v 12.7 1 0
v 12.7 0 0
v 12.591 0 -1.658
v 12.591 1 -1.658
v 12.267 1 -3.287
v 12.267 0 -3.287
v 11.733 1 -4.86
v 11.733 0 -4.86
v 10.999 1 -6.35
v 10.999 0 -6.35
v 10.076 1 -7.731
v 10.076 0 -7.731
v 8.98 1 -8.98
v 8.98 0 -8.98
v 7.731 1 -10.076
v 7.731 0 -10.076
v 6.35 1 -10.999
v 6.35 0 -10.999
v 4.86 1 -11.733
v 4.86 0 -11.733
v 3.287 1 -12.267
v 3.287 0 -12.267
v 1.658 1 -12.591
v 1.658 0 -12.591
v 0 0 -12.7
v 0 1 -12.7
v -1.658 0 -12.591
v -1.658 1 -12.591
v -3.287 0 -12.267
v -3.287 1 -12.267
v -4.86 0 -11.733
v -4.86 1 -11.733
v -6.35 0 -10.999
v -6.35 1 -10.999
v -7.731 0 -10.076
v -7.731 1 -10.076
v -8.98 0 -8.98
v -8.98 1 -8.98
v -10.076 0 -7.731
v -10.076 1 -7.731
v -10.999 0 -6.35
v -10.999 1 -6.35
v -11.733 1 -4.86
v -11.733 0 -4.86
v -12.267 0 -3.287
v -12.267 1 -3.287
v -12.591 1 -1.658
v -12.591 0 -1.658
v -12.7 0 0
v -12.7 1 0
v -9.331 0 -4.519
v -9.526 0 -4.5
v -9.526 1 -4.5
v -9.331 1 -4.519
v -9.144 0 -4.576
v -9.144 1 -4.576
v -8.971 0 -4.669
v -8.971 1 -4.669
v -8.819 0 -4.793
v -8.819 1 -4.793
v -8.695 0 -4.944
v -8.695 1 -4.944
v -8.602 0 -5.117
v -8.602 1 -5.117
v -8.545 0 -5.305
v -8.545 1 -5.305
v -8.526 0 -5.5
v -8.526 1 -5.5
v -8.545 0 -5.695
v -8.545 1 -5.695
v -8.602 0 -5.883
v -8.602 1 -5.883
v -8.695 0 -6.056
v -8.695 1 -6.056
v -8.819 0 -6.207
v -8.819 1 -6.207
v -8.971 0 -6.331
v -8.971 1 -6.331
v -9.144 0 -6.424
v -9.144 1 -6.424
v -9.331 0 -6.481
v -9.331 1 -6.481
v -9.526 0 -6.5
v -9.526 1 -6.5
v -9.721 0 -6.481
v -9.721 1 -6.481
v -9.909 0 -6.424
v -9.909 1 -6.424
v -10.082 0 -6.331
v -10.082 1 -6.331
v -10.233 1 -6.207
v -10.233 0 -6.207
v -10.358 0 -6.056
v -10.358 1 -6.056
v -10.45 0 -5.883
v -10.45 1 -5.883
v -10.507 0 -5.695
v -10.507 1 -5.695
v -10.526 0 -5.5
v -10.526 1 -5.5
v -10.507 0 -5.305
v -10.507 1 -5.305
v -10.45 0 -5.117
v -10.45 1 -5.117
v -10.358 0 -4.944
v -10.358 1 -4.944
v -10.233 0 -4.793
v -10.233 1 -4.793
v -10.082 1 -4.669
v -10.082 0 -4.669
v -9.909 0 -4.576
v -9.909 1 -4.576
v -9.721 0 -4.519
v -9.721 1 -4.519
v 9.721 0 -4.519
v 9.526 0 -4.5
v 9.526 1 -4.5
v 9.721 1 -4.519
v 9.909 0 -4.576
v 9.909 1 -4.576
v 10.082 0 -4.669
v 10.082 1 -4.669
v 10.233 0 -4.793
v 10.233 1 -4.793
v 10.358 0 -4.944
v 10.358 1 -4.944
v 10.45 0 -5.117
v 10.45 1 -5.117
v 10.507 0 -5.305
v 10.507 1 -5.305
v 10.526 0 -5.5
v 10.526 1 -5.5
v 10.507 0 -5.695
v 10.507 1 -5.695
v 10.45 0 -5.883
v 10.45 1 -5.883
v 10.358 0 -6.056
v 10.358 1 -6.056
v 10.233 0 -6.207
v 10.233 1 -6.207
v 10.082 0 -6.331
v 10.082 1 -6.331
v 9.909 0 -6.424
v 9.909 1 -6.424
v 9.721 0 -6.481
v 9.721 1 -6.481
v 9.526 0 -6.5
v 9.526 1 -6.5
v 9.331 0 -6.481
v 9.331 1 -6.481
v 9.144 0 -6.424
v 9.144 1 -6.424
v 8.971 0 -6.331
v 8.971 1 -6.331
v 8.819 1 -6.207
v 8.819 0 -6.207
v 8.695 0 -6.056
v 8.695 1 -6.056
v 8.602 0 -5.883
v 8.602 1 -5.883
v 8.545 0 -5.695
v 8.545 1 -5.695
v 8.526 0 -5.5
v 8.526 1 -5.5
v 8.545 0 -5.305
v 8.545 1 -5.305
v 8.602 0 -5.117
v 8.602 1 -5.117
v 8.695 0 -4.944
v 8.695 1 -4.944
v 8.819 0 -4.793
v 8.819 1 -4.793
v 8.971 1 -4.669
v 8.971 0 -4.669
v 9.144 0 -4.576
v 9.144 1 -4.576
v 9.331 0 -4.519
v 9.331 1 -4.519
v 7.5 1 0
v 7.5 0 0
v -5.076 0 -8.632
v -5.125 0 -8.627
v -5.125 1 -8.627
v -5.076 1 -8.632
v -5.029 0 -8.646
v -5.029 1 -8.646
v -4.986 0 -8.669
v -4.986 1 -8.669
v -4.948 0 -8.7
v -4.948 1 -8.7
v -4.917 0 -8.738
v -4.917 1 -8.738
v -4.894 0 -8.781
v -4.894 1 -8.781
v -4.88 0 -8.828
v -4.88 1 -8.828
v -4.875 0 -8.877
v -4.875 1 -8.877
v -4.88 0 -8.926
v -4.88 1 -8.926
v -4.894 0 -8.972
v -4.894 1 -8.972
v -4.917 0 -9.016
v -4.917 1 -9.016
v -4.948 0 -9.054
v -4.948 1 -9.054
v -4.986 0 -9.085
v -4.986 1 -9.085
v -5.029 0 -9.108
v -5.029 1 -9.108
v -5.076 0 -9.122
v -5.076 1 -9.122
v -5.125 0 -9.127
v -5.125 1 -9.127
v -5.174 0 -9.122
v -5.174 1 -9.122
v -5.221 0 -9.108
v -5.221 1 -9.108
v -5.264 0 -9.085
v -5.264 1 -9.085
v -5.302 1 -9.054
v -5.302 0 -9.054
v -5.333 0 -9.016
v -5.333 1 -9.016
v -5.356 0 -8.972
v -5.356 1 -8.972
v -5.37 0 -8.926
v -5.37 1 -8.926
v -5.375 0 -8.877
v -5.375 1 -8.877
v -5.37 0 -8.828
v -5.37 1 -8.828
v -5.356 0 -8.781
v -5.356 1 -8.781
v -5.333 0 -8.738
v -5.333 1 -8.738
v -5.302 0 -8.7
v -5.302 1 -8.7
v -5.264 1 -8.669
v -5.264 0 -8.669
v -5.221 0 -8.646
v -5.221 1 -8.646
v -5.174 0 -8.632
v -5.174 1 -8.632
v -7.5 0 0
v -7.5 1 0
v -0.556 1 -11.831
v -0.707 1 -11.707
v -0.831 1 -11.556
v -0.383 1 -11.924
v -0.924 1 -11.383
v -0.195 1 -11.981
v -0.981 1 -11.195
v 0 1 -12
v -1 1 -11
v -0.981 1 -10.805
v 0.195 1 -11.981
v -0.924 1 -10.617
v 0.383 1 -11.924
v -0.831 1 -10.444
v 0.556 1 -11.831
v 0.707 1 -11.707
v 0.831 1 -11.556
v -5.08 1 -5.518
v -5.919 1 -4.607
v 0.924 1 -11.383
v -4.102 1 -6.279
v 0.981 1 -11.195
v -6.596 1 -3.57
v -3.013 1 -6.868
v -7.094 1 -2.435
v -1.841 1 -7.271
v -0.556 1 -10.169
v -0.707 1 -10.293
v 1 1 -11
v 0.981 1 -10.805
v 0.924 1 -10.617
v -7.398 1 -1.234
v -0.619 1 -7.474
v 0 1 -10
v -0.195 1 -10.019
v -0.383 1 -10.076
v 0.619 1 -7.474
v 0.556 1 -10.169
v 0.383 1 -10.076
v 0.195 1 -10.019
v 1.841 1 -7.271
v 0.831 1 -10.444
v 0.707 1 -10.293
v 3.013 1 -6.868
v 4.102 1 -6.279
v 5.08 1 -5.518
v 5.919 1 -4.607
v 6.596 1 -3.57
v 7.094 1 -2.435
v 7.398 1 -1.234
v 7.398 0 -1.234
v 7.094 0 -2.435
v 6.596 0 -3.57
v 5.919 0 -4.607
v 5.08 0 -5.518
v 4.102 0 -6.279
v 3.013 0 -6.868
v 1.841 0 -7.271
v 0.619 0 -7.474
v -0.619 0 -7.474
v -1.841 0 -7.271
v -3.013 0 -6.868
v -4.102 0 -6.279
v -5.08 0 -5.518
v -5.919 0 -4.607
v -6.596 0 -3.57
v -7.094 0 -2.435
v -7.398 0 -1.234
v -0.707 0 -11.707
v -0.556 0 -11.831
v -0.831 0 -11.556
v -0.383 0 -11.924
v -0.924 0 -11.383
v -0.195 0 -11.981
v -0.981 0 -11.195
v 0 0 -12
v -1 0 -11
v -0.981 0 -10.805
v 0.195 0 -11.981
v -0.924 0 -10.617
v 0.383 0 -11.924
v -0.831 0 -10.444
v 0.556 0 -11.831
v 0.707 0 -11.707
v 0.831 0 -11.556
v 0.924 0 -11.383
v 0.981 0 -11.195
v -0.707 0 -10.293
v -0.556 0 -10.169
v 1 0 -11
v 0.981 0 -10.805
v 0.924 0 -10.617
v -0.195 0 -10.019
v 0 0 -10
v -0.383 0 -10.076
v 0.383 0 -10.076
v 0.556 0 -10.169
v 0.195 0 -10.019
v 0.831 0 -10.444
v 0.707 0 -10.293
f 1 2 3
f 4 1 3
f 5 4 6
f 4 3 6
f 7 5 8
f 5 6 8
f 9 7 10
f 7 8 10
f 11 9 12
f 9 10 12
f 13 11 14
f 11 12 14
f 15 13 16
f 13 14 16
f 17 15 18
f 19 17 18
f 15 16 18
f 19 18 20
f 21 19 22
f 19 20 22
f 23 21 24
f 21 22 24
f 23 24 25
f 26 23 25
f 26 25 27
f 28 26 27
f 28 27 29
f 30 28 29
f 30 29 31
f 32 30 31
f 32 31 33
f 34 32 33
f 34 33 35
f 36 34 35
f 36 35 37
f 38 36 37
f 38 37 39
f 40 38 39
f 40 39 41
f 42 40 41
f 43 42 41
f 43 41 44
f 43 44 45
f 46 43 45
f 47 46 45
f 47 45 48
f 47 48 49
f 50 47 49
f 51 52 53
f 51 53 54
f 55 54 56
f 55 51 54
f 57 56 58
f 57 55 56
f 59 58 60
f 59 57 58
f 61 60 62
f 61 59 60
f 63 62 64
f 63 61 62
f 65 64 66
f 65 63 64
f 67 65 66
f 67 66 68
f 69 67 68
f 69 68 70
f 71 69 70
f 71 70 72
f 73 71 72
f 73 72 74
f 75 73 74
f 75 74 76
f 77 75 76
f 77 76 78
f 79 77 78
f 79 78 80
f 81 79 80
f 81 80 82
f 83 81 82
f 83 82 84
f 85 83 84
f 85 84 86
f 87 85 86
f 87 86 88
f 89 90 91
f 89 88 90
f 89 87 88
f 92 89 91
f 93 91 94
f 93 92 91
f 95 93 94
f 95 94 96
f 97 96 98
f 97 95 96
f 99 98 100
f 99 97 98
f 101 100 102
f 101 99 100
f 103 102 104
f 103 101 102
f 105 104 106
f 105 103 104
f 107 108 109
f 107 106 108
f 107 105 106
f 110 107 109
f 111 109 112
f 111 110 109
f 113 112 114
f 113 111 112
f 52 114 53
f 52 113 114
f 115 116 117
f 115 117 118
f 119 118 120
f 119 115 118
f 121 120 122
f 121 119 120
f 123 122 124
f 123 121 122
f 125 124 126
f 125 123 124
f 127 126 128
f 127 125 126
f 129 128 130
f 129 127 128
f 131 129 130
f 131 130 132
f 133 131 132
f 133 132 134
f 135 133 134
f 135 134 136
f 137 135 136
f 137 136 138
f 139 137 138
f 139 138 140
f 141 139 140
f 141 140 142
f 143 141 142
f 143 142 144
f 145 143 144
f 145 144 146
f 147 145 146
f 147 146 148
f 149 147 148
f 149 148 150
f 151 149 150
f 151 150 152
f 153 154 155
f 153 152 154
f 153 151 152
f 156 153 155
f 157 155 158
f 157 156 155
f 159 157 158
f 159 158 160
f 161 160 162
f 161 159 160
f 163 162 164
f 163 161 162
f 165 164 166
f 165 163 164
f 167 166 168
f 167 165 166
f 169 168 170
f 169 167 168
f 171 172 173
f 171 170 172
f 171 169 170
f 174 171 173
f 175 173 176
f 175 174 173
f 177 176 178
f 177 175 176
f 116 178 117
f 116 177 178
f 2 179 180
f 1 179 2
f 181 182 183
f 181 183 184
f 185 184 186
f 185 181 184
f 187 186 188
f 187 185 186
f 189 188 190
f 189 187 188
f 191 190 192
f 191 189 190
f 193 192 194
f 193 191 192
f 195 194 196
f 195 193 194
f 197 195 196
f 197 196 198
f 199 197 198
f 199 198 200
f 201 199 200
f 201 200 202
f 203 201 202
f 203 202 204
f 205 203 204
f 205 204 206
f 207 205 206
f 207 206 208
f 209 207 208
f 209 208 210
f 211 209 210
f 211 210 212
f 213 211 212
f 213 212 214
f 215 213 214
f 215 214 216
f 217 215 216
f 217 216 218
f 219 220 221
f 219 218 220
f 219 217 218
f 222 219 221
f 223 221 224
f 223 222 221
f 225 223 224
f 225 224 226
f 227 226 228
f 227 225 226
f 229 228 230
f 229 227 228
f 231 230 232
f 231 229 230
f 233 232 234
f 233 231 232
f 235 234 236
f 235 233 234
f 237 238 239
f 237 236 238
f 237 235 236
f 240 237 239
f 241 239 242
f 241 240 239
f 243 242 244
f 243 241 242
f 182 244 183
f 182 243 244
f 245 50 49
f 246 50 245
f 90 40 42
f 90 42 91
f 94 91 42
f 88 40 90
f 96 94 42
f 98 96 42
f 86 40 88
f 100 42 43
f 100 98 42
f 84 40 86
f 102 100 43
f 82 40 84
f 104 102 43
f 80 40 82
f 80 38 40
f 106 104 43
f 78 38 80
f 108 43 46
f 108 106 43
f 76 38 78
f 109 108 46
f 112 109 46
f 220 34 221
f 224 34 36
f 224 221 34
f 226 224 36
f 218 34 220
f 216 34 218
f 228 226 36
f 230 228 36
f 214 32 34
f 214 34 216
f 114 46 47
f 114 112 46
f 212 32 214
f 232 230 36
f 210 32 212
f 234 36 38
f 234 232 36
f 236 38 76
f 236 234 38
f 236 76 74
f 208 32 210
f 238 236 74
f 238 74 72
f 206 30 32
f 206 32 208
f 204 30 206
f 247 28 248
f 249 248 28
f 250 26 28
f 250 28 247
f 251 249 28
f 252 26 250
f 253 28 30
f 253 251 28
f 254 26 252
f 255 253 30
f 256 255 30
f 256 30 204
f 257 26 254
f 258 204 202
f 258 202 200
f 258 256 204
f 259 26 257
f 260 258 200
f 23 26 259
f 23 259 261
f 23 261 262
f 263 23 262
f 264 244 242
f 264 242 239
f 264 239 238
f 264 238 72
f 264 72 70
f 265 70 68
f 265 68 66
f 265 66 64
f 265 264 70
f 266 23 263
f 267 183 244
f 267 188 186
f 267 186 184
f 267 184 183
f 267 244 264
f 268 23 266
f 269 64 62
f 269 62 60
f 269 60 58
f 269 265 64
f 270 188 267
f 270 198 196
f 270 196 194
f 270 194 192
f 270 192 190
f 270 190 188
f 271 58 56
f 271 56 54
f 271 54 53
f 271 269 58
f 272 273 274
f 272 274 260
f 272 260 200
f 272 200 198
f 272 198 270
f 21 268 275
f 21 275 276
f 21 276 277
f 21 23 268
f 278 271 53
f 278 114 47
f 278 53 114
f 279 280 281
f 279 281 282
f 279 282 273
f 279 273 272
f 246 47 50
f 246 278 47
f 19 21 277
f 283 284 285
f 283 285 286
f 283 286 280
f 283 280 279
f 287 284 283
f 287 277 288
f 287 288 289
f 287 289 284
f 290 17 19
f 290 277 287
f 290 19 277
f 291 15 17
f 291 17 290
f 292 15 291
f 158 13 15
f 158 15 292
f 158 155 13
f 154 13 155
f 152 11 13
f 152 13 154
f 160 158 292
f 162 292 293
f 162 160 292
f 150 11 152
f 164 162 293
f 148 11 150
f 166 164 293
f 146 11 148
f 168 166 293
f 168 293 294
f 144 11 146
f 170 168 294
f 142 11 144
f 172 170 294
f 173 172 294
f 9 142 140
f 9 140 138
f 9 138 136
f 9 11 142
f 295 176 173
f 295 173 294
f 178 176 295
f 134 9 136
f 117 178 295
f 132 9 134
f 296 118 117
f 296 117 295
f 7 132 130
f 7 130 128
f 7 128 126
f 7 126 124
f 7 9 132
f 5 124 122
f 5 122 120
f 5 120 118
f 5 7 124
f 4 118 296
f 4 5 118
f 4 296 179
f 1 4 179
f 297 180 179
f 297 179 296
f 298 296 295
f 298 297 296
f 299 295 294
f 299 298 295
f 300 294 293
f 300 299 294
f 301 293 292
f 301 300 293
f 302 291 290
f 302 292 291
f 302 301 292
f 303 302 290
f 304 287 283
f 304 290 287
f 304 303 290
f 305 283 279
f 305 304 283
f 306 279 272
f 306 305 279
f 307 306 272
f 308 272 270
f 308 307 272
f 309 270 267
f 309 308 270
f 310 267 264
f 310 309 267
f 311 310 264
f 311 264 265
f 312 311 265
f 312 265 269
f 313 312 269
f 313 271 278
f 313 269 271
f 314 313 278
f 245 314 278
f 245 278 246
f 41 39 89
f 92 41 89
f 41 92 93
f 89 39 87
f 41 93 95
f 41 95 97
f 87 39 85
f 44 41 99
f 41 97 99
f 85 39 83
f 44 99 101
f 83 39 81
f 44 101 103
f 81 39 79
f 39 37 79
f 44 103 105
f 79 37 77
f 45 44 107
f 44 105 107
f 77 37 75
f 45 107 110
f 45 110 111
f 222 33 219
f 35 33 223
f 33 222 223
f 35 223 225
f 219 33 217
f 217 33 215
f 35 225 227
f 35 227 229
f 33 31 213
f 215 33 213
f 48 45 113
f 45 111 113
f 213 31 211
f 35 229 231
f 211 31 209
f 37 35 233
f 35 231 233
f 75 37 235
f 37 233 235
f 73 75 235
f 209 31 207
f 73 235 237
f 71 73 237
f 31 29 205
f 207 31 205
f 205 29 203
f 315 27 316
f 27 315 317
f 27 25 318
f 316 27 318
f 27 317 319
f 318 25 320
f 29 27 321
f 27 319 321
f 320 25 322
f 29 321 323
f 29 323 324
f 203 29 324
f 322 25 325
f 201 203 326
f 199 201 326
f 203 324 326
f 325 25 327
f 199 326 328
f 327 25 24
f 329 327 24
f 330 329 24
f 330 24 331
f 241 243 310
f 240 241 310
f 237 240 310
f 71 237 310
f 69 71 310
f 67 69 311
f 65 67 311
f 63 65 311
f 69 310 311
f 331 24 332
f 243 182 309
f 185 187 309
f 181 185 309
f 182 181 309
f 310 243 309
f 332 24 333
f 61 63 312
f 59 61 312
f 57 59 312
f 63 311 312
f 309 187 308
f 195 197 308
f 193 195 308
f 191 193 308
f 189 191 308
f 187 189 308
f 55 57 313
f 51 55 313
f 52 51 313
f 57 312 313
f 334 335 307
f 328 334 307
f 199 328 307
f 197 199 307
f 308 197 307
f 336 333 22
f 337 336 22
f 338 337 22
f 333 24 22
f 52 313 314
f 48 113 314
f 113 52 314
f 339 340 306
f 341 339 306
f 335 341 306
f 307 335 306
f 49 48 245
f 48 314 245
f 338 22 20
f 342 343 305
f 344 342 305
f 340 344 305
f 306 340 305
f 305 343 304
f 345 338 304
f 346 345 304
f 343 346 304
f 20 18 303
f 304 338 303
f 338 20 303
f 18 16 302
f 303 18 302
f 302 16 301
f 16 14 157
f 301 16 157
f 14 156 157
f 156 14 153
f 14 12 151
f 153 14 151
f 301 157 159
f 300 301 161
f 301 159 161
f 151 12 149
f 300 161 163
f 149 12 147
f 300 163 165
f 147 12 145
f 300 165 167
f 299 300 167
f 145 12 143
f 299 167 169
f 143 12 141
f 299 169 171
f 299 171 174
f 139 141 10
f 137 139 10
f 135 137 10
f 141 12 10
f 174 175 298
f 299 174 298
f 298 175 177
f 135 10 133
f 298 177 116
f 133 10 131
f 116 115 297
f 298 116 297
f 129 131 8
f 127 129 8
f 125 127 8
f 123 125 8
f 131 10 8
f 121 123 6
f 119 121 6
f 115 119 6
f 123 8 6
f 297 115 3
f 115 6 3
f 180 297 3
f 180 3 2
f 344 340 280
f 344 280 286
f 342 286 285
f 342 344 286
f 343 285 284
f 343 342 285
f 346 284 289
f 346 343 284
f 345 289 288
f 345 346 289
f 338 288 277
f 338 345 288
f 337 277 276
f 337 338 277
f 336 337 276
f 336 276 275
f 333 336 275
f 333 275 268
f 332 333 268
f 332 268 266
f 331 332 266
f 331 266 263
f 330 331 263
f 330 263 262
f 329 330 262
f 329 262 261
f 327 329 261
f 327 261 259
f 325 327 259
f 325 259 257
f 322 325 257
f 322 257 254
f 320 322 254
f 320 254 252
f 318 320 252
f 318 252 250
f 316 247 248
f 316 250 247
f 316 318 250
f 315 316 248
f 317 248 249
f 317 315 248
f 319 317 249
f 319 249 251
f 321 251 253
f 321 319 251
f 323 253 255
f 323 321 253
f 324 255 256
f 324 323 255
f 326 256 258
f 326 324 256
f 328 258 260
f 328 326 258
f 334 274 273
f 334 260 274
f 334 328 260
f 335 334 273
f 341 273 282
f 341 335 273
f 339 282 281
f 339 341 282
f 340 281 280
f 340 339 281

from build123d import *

# Parameters (mm, degrees)
SKETCH1_R               = 12.7
BOSS_EXTRUDE1_DEPTH     = 1
CUT_EXTRUDE1_DEPTH      = 18.98832955
CUT_EXTRUDE1_DEPTH_BACK = 18.98832955
SKETCH19_R              = 1
CUT_EXTRUDE2_DEPTH      = 18.98832955
CUT_EXTRUDE2_DEPTH_BACK = 18.98832955
SKETCH20_R              = 7.5
SKETCH21_W              = 65.874202484
SKETCH21_H              = 51.979273979
CUT_EXTRUDE3_DEPTH      = 18.98832955
CUT_EXTRUDE4_DEPTH      = 18.98832955
CUT_EXTRUDE4_DEPTH_BACK = 18.98832955
SKETCH22_R              = 0.25


with BuildPart() as part:
    # Sketch1 → Boss-Extrude1 (new body)
    with BuildSketch(Plane(origin=(0, 0, 0), x_dir=(1, 0, 0), z_dir=(0, 1, 0))):
        with Locations(Location((0, 0, 0), (0, 0, 270))):
            Circle(SKETCH1_R)
    extrude(amount=BOSS_EXTRUDE1_DEPTH)

    # Sketch19 → Cut-Extrude1 (cut, two sides: drawn at the far end of the back side and taken through both)
    with BuildSketch(Plane(origin=(0, 1, 0), x_dir=(1, 0, 0), z_dir=(0, 1, 0)).offset(-CUT_EXTRUDE1_DEPTH_BACK)):
        with Locations(Location((0, 11, 0), (0, 0, 270))):
            Circle(SKETCH19_R)
        with Locations(Location((9.526279442, 5.5, 0), (0, 0, 270))):
            Circle(SKETCH19_R)
        with Locations(Location((9.526279442, -5.5, 0), (0, 0, 270))):
            Circle(SKETCH19_R)
        with Locations(Location((0, -11, 0), (0, 0, 270))):
            Circle(SKETCH19_R)
        with Locations(Location((-9.526279442, -5.5, 0), (0, 0, 270))):
            Circle(SKETCH19_R)
        with Locations(Location((-9.526279442, 5.5, 0), (0, 0, 270))):
            Circle(SKETCH19_R)
    extrude(amount=CUT_EXTRUDE1_DEPTH + CUT_EXTRUDE1_DEPTH_BACK, mode=Mode.SUBTRACT)

    # Sketch20 → Cut-Extrude2 (cut, two sides: drawn at the far end of the back side and taken through both)
    with BuildSketch(Plane(origin=(0, 1, 0), x_dir=(1, 0, 0), z_dir=(0, 1, 0)).offset(-CUT_EXTRUDE2_DEPTH_BACK)):
        with Locations(Location((0, 0, 0), (0, 0, 270))):
            Circle(SKETCH20_R)
    extrude(amount=CUT_EXTRUDE2_DEPTH + CUT_EXTRUDE2_DEPTH_BACK, mode=Mode.SUBTRACT)

    # Sketch21 → Cut-Extrude3 (cut, through all)
    with BuildSketch(Plane.XY):
        with Locations((-3.816154381, 6.321647006)):
            Rectangle(SKETCH21_W, SKETCH21_H)
    extrude(amount=CUT_EXTRUDE3_DEPTH, mode=Mode.SUBTRACT)

    # Sketch22 → Cut-Extrude4 (cut, two sides: drawn at the far end of the back side and taken through both)
    with BuildSketch(Plane(origin=(0, 1, 0), x_dir=(1, 0, 0), z_dir=(0, 1, 0)).offset(-CUT_EXTRUDE4_DEPTH_BACK)):
        with Locations(Location((-5.125, 8.876760389, 0), (0, 0, 270))):
            Circle(SKETCH22_R)
    extrude(amount=CUT_EXTRUDE4_DEPTH + CUT_EXTRUDE4_DEPTH_BACK, mode=Mode.SUBTRACT)


solid = part.part
